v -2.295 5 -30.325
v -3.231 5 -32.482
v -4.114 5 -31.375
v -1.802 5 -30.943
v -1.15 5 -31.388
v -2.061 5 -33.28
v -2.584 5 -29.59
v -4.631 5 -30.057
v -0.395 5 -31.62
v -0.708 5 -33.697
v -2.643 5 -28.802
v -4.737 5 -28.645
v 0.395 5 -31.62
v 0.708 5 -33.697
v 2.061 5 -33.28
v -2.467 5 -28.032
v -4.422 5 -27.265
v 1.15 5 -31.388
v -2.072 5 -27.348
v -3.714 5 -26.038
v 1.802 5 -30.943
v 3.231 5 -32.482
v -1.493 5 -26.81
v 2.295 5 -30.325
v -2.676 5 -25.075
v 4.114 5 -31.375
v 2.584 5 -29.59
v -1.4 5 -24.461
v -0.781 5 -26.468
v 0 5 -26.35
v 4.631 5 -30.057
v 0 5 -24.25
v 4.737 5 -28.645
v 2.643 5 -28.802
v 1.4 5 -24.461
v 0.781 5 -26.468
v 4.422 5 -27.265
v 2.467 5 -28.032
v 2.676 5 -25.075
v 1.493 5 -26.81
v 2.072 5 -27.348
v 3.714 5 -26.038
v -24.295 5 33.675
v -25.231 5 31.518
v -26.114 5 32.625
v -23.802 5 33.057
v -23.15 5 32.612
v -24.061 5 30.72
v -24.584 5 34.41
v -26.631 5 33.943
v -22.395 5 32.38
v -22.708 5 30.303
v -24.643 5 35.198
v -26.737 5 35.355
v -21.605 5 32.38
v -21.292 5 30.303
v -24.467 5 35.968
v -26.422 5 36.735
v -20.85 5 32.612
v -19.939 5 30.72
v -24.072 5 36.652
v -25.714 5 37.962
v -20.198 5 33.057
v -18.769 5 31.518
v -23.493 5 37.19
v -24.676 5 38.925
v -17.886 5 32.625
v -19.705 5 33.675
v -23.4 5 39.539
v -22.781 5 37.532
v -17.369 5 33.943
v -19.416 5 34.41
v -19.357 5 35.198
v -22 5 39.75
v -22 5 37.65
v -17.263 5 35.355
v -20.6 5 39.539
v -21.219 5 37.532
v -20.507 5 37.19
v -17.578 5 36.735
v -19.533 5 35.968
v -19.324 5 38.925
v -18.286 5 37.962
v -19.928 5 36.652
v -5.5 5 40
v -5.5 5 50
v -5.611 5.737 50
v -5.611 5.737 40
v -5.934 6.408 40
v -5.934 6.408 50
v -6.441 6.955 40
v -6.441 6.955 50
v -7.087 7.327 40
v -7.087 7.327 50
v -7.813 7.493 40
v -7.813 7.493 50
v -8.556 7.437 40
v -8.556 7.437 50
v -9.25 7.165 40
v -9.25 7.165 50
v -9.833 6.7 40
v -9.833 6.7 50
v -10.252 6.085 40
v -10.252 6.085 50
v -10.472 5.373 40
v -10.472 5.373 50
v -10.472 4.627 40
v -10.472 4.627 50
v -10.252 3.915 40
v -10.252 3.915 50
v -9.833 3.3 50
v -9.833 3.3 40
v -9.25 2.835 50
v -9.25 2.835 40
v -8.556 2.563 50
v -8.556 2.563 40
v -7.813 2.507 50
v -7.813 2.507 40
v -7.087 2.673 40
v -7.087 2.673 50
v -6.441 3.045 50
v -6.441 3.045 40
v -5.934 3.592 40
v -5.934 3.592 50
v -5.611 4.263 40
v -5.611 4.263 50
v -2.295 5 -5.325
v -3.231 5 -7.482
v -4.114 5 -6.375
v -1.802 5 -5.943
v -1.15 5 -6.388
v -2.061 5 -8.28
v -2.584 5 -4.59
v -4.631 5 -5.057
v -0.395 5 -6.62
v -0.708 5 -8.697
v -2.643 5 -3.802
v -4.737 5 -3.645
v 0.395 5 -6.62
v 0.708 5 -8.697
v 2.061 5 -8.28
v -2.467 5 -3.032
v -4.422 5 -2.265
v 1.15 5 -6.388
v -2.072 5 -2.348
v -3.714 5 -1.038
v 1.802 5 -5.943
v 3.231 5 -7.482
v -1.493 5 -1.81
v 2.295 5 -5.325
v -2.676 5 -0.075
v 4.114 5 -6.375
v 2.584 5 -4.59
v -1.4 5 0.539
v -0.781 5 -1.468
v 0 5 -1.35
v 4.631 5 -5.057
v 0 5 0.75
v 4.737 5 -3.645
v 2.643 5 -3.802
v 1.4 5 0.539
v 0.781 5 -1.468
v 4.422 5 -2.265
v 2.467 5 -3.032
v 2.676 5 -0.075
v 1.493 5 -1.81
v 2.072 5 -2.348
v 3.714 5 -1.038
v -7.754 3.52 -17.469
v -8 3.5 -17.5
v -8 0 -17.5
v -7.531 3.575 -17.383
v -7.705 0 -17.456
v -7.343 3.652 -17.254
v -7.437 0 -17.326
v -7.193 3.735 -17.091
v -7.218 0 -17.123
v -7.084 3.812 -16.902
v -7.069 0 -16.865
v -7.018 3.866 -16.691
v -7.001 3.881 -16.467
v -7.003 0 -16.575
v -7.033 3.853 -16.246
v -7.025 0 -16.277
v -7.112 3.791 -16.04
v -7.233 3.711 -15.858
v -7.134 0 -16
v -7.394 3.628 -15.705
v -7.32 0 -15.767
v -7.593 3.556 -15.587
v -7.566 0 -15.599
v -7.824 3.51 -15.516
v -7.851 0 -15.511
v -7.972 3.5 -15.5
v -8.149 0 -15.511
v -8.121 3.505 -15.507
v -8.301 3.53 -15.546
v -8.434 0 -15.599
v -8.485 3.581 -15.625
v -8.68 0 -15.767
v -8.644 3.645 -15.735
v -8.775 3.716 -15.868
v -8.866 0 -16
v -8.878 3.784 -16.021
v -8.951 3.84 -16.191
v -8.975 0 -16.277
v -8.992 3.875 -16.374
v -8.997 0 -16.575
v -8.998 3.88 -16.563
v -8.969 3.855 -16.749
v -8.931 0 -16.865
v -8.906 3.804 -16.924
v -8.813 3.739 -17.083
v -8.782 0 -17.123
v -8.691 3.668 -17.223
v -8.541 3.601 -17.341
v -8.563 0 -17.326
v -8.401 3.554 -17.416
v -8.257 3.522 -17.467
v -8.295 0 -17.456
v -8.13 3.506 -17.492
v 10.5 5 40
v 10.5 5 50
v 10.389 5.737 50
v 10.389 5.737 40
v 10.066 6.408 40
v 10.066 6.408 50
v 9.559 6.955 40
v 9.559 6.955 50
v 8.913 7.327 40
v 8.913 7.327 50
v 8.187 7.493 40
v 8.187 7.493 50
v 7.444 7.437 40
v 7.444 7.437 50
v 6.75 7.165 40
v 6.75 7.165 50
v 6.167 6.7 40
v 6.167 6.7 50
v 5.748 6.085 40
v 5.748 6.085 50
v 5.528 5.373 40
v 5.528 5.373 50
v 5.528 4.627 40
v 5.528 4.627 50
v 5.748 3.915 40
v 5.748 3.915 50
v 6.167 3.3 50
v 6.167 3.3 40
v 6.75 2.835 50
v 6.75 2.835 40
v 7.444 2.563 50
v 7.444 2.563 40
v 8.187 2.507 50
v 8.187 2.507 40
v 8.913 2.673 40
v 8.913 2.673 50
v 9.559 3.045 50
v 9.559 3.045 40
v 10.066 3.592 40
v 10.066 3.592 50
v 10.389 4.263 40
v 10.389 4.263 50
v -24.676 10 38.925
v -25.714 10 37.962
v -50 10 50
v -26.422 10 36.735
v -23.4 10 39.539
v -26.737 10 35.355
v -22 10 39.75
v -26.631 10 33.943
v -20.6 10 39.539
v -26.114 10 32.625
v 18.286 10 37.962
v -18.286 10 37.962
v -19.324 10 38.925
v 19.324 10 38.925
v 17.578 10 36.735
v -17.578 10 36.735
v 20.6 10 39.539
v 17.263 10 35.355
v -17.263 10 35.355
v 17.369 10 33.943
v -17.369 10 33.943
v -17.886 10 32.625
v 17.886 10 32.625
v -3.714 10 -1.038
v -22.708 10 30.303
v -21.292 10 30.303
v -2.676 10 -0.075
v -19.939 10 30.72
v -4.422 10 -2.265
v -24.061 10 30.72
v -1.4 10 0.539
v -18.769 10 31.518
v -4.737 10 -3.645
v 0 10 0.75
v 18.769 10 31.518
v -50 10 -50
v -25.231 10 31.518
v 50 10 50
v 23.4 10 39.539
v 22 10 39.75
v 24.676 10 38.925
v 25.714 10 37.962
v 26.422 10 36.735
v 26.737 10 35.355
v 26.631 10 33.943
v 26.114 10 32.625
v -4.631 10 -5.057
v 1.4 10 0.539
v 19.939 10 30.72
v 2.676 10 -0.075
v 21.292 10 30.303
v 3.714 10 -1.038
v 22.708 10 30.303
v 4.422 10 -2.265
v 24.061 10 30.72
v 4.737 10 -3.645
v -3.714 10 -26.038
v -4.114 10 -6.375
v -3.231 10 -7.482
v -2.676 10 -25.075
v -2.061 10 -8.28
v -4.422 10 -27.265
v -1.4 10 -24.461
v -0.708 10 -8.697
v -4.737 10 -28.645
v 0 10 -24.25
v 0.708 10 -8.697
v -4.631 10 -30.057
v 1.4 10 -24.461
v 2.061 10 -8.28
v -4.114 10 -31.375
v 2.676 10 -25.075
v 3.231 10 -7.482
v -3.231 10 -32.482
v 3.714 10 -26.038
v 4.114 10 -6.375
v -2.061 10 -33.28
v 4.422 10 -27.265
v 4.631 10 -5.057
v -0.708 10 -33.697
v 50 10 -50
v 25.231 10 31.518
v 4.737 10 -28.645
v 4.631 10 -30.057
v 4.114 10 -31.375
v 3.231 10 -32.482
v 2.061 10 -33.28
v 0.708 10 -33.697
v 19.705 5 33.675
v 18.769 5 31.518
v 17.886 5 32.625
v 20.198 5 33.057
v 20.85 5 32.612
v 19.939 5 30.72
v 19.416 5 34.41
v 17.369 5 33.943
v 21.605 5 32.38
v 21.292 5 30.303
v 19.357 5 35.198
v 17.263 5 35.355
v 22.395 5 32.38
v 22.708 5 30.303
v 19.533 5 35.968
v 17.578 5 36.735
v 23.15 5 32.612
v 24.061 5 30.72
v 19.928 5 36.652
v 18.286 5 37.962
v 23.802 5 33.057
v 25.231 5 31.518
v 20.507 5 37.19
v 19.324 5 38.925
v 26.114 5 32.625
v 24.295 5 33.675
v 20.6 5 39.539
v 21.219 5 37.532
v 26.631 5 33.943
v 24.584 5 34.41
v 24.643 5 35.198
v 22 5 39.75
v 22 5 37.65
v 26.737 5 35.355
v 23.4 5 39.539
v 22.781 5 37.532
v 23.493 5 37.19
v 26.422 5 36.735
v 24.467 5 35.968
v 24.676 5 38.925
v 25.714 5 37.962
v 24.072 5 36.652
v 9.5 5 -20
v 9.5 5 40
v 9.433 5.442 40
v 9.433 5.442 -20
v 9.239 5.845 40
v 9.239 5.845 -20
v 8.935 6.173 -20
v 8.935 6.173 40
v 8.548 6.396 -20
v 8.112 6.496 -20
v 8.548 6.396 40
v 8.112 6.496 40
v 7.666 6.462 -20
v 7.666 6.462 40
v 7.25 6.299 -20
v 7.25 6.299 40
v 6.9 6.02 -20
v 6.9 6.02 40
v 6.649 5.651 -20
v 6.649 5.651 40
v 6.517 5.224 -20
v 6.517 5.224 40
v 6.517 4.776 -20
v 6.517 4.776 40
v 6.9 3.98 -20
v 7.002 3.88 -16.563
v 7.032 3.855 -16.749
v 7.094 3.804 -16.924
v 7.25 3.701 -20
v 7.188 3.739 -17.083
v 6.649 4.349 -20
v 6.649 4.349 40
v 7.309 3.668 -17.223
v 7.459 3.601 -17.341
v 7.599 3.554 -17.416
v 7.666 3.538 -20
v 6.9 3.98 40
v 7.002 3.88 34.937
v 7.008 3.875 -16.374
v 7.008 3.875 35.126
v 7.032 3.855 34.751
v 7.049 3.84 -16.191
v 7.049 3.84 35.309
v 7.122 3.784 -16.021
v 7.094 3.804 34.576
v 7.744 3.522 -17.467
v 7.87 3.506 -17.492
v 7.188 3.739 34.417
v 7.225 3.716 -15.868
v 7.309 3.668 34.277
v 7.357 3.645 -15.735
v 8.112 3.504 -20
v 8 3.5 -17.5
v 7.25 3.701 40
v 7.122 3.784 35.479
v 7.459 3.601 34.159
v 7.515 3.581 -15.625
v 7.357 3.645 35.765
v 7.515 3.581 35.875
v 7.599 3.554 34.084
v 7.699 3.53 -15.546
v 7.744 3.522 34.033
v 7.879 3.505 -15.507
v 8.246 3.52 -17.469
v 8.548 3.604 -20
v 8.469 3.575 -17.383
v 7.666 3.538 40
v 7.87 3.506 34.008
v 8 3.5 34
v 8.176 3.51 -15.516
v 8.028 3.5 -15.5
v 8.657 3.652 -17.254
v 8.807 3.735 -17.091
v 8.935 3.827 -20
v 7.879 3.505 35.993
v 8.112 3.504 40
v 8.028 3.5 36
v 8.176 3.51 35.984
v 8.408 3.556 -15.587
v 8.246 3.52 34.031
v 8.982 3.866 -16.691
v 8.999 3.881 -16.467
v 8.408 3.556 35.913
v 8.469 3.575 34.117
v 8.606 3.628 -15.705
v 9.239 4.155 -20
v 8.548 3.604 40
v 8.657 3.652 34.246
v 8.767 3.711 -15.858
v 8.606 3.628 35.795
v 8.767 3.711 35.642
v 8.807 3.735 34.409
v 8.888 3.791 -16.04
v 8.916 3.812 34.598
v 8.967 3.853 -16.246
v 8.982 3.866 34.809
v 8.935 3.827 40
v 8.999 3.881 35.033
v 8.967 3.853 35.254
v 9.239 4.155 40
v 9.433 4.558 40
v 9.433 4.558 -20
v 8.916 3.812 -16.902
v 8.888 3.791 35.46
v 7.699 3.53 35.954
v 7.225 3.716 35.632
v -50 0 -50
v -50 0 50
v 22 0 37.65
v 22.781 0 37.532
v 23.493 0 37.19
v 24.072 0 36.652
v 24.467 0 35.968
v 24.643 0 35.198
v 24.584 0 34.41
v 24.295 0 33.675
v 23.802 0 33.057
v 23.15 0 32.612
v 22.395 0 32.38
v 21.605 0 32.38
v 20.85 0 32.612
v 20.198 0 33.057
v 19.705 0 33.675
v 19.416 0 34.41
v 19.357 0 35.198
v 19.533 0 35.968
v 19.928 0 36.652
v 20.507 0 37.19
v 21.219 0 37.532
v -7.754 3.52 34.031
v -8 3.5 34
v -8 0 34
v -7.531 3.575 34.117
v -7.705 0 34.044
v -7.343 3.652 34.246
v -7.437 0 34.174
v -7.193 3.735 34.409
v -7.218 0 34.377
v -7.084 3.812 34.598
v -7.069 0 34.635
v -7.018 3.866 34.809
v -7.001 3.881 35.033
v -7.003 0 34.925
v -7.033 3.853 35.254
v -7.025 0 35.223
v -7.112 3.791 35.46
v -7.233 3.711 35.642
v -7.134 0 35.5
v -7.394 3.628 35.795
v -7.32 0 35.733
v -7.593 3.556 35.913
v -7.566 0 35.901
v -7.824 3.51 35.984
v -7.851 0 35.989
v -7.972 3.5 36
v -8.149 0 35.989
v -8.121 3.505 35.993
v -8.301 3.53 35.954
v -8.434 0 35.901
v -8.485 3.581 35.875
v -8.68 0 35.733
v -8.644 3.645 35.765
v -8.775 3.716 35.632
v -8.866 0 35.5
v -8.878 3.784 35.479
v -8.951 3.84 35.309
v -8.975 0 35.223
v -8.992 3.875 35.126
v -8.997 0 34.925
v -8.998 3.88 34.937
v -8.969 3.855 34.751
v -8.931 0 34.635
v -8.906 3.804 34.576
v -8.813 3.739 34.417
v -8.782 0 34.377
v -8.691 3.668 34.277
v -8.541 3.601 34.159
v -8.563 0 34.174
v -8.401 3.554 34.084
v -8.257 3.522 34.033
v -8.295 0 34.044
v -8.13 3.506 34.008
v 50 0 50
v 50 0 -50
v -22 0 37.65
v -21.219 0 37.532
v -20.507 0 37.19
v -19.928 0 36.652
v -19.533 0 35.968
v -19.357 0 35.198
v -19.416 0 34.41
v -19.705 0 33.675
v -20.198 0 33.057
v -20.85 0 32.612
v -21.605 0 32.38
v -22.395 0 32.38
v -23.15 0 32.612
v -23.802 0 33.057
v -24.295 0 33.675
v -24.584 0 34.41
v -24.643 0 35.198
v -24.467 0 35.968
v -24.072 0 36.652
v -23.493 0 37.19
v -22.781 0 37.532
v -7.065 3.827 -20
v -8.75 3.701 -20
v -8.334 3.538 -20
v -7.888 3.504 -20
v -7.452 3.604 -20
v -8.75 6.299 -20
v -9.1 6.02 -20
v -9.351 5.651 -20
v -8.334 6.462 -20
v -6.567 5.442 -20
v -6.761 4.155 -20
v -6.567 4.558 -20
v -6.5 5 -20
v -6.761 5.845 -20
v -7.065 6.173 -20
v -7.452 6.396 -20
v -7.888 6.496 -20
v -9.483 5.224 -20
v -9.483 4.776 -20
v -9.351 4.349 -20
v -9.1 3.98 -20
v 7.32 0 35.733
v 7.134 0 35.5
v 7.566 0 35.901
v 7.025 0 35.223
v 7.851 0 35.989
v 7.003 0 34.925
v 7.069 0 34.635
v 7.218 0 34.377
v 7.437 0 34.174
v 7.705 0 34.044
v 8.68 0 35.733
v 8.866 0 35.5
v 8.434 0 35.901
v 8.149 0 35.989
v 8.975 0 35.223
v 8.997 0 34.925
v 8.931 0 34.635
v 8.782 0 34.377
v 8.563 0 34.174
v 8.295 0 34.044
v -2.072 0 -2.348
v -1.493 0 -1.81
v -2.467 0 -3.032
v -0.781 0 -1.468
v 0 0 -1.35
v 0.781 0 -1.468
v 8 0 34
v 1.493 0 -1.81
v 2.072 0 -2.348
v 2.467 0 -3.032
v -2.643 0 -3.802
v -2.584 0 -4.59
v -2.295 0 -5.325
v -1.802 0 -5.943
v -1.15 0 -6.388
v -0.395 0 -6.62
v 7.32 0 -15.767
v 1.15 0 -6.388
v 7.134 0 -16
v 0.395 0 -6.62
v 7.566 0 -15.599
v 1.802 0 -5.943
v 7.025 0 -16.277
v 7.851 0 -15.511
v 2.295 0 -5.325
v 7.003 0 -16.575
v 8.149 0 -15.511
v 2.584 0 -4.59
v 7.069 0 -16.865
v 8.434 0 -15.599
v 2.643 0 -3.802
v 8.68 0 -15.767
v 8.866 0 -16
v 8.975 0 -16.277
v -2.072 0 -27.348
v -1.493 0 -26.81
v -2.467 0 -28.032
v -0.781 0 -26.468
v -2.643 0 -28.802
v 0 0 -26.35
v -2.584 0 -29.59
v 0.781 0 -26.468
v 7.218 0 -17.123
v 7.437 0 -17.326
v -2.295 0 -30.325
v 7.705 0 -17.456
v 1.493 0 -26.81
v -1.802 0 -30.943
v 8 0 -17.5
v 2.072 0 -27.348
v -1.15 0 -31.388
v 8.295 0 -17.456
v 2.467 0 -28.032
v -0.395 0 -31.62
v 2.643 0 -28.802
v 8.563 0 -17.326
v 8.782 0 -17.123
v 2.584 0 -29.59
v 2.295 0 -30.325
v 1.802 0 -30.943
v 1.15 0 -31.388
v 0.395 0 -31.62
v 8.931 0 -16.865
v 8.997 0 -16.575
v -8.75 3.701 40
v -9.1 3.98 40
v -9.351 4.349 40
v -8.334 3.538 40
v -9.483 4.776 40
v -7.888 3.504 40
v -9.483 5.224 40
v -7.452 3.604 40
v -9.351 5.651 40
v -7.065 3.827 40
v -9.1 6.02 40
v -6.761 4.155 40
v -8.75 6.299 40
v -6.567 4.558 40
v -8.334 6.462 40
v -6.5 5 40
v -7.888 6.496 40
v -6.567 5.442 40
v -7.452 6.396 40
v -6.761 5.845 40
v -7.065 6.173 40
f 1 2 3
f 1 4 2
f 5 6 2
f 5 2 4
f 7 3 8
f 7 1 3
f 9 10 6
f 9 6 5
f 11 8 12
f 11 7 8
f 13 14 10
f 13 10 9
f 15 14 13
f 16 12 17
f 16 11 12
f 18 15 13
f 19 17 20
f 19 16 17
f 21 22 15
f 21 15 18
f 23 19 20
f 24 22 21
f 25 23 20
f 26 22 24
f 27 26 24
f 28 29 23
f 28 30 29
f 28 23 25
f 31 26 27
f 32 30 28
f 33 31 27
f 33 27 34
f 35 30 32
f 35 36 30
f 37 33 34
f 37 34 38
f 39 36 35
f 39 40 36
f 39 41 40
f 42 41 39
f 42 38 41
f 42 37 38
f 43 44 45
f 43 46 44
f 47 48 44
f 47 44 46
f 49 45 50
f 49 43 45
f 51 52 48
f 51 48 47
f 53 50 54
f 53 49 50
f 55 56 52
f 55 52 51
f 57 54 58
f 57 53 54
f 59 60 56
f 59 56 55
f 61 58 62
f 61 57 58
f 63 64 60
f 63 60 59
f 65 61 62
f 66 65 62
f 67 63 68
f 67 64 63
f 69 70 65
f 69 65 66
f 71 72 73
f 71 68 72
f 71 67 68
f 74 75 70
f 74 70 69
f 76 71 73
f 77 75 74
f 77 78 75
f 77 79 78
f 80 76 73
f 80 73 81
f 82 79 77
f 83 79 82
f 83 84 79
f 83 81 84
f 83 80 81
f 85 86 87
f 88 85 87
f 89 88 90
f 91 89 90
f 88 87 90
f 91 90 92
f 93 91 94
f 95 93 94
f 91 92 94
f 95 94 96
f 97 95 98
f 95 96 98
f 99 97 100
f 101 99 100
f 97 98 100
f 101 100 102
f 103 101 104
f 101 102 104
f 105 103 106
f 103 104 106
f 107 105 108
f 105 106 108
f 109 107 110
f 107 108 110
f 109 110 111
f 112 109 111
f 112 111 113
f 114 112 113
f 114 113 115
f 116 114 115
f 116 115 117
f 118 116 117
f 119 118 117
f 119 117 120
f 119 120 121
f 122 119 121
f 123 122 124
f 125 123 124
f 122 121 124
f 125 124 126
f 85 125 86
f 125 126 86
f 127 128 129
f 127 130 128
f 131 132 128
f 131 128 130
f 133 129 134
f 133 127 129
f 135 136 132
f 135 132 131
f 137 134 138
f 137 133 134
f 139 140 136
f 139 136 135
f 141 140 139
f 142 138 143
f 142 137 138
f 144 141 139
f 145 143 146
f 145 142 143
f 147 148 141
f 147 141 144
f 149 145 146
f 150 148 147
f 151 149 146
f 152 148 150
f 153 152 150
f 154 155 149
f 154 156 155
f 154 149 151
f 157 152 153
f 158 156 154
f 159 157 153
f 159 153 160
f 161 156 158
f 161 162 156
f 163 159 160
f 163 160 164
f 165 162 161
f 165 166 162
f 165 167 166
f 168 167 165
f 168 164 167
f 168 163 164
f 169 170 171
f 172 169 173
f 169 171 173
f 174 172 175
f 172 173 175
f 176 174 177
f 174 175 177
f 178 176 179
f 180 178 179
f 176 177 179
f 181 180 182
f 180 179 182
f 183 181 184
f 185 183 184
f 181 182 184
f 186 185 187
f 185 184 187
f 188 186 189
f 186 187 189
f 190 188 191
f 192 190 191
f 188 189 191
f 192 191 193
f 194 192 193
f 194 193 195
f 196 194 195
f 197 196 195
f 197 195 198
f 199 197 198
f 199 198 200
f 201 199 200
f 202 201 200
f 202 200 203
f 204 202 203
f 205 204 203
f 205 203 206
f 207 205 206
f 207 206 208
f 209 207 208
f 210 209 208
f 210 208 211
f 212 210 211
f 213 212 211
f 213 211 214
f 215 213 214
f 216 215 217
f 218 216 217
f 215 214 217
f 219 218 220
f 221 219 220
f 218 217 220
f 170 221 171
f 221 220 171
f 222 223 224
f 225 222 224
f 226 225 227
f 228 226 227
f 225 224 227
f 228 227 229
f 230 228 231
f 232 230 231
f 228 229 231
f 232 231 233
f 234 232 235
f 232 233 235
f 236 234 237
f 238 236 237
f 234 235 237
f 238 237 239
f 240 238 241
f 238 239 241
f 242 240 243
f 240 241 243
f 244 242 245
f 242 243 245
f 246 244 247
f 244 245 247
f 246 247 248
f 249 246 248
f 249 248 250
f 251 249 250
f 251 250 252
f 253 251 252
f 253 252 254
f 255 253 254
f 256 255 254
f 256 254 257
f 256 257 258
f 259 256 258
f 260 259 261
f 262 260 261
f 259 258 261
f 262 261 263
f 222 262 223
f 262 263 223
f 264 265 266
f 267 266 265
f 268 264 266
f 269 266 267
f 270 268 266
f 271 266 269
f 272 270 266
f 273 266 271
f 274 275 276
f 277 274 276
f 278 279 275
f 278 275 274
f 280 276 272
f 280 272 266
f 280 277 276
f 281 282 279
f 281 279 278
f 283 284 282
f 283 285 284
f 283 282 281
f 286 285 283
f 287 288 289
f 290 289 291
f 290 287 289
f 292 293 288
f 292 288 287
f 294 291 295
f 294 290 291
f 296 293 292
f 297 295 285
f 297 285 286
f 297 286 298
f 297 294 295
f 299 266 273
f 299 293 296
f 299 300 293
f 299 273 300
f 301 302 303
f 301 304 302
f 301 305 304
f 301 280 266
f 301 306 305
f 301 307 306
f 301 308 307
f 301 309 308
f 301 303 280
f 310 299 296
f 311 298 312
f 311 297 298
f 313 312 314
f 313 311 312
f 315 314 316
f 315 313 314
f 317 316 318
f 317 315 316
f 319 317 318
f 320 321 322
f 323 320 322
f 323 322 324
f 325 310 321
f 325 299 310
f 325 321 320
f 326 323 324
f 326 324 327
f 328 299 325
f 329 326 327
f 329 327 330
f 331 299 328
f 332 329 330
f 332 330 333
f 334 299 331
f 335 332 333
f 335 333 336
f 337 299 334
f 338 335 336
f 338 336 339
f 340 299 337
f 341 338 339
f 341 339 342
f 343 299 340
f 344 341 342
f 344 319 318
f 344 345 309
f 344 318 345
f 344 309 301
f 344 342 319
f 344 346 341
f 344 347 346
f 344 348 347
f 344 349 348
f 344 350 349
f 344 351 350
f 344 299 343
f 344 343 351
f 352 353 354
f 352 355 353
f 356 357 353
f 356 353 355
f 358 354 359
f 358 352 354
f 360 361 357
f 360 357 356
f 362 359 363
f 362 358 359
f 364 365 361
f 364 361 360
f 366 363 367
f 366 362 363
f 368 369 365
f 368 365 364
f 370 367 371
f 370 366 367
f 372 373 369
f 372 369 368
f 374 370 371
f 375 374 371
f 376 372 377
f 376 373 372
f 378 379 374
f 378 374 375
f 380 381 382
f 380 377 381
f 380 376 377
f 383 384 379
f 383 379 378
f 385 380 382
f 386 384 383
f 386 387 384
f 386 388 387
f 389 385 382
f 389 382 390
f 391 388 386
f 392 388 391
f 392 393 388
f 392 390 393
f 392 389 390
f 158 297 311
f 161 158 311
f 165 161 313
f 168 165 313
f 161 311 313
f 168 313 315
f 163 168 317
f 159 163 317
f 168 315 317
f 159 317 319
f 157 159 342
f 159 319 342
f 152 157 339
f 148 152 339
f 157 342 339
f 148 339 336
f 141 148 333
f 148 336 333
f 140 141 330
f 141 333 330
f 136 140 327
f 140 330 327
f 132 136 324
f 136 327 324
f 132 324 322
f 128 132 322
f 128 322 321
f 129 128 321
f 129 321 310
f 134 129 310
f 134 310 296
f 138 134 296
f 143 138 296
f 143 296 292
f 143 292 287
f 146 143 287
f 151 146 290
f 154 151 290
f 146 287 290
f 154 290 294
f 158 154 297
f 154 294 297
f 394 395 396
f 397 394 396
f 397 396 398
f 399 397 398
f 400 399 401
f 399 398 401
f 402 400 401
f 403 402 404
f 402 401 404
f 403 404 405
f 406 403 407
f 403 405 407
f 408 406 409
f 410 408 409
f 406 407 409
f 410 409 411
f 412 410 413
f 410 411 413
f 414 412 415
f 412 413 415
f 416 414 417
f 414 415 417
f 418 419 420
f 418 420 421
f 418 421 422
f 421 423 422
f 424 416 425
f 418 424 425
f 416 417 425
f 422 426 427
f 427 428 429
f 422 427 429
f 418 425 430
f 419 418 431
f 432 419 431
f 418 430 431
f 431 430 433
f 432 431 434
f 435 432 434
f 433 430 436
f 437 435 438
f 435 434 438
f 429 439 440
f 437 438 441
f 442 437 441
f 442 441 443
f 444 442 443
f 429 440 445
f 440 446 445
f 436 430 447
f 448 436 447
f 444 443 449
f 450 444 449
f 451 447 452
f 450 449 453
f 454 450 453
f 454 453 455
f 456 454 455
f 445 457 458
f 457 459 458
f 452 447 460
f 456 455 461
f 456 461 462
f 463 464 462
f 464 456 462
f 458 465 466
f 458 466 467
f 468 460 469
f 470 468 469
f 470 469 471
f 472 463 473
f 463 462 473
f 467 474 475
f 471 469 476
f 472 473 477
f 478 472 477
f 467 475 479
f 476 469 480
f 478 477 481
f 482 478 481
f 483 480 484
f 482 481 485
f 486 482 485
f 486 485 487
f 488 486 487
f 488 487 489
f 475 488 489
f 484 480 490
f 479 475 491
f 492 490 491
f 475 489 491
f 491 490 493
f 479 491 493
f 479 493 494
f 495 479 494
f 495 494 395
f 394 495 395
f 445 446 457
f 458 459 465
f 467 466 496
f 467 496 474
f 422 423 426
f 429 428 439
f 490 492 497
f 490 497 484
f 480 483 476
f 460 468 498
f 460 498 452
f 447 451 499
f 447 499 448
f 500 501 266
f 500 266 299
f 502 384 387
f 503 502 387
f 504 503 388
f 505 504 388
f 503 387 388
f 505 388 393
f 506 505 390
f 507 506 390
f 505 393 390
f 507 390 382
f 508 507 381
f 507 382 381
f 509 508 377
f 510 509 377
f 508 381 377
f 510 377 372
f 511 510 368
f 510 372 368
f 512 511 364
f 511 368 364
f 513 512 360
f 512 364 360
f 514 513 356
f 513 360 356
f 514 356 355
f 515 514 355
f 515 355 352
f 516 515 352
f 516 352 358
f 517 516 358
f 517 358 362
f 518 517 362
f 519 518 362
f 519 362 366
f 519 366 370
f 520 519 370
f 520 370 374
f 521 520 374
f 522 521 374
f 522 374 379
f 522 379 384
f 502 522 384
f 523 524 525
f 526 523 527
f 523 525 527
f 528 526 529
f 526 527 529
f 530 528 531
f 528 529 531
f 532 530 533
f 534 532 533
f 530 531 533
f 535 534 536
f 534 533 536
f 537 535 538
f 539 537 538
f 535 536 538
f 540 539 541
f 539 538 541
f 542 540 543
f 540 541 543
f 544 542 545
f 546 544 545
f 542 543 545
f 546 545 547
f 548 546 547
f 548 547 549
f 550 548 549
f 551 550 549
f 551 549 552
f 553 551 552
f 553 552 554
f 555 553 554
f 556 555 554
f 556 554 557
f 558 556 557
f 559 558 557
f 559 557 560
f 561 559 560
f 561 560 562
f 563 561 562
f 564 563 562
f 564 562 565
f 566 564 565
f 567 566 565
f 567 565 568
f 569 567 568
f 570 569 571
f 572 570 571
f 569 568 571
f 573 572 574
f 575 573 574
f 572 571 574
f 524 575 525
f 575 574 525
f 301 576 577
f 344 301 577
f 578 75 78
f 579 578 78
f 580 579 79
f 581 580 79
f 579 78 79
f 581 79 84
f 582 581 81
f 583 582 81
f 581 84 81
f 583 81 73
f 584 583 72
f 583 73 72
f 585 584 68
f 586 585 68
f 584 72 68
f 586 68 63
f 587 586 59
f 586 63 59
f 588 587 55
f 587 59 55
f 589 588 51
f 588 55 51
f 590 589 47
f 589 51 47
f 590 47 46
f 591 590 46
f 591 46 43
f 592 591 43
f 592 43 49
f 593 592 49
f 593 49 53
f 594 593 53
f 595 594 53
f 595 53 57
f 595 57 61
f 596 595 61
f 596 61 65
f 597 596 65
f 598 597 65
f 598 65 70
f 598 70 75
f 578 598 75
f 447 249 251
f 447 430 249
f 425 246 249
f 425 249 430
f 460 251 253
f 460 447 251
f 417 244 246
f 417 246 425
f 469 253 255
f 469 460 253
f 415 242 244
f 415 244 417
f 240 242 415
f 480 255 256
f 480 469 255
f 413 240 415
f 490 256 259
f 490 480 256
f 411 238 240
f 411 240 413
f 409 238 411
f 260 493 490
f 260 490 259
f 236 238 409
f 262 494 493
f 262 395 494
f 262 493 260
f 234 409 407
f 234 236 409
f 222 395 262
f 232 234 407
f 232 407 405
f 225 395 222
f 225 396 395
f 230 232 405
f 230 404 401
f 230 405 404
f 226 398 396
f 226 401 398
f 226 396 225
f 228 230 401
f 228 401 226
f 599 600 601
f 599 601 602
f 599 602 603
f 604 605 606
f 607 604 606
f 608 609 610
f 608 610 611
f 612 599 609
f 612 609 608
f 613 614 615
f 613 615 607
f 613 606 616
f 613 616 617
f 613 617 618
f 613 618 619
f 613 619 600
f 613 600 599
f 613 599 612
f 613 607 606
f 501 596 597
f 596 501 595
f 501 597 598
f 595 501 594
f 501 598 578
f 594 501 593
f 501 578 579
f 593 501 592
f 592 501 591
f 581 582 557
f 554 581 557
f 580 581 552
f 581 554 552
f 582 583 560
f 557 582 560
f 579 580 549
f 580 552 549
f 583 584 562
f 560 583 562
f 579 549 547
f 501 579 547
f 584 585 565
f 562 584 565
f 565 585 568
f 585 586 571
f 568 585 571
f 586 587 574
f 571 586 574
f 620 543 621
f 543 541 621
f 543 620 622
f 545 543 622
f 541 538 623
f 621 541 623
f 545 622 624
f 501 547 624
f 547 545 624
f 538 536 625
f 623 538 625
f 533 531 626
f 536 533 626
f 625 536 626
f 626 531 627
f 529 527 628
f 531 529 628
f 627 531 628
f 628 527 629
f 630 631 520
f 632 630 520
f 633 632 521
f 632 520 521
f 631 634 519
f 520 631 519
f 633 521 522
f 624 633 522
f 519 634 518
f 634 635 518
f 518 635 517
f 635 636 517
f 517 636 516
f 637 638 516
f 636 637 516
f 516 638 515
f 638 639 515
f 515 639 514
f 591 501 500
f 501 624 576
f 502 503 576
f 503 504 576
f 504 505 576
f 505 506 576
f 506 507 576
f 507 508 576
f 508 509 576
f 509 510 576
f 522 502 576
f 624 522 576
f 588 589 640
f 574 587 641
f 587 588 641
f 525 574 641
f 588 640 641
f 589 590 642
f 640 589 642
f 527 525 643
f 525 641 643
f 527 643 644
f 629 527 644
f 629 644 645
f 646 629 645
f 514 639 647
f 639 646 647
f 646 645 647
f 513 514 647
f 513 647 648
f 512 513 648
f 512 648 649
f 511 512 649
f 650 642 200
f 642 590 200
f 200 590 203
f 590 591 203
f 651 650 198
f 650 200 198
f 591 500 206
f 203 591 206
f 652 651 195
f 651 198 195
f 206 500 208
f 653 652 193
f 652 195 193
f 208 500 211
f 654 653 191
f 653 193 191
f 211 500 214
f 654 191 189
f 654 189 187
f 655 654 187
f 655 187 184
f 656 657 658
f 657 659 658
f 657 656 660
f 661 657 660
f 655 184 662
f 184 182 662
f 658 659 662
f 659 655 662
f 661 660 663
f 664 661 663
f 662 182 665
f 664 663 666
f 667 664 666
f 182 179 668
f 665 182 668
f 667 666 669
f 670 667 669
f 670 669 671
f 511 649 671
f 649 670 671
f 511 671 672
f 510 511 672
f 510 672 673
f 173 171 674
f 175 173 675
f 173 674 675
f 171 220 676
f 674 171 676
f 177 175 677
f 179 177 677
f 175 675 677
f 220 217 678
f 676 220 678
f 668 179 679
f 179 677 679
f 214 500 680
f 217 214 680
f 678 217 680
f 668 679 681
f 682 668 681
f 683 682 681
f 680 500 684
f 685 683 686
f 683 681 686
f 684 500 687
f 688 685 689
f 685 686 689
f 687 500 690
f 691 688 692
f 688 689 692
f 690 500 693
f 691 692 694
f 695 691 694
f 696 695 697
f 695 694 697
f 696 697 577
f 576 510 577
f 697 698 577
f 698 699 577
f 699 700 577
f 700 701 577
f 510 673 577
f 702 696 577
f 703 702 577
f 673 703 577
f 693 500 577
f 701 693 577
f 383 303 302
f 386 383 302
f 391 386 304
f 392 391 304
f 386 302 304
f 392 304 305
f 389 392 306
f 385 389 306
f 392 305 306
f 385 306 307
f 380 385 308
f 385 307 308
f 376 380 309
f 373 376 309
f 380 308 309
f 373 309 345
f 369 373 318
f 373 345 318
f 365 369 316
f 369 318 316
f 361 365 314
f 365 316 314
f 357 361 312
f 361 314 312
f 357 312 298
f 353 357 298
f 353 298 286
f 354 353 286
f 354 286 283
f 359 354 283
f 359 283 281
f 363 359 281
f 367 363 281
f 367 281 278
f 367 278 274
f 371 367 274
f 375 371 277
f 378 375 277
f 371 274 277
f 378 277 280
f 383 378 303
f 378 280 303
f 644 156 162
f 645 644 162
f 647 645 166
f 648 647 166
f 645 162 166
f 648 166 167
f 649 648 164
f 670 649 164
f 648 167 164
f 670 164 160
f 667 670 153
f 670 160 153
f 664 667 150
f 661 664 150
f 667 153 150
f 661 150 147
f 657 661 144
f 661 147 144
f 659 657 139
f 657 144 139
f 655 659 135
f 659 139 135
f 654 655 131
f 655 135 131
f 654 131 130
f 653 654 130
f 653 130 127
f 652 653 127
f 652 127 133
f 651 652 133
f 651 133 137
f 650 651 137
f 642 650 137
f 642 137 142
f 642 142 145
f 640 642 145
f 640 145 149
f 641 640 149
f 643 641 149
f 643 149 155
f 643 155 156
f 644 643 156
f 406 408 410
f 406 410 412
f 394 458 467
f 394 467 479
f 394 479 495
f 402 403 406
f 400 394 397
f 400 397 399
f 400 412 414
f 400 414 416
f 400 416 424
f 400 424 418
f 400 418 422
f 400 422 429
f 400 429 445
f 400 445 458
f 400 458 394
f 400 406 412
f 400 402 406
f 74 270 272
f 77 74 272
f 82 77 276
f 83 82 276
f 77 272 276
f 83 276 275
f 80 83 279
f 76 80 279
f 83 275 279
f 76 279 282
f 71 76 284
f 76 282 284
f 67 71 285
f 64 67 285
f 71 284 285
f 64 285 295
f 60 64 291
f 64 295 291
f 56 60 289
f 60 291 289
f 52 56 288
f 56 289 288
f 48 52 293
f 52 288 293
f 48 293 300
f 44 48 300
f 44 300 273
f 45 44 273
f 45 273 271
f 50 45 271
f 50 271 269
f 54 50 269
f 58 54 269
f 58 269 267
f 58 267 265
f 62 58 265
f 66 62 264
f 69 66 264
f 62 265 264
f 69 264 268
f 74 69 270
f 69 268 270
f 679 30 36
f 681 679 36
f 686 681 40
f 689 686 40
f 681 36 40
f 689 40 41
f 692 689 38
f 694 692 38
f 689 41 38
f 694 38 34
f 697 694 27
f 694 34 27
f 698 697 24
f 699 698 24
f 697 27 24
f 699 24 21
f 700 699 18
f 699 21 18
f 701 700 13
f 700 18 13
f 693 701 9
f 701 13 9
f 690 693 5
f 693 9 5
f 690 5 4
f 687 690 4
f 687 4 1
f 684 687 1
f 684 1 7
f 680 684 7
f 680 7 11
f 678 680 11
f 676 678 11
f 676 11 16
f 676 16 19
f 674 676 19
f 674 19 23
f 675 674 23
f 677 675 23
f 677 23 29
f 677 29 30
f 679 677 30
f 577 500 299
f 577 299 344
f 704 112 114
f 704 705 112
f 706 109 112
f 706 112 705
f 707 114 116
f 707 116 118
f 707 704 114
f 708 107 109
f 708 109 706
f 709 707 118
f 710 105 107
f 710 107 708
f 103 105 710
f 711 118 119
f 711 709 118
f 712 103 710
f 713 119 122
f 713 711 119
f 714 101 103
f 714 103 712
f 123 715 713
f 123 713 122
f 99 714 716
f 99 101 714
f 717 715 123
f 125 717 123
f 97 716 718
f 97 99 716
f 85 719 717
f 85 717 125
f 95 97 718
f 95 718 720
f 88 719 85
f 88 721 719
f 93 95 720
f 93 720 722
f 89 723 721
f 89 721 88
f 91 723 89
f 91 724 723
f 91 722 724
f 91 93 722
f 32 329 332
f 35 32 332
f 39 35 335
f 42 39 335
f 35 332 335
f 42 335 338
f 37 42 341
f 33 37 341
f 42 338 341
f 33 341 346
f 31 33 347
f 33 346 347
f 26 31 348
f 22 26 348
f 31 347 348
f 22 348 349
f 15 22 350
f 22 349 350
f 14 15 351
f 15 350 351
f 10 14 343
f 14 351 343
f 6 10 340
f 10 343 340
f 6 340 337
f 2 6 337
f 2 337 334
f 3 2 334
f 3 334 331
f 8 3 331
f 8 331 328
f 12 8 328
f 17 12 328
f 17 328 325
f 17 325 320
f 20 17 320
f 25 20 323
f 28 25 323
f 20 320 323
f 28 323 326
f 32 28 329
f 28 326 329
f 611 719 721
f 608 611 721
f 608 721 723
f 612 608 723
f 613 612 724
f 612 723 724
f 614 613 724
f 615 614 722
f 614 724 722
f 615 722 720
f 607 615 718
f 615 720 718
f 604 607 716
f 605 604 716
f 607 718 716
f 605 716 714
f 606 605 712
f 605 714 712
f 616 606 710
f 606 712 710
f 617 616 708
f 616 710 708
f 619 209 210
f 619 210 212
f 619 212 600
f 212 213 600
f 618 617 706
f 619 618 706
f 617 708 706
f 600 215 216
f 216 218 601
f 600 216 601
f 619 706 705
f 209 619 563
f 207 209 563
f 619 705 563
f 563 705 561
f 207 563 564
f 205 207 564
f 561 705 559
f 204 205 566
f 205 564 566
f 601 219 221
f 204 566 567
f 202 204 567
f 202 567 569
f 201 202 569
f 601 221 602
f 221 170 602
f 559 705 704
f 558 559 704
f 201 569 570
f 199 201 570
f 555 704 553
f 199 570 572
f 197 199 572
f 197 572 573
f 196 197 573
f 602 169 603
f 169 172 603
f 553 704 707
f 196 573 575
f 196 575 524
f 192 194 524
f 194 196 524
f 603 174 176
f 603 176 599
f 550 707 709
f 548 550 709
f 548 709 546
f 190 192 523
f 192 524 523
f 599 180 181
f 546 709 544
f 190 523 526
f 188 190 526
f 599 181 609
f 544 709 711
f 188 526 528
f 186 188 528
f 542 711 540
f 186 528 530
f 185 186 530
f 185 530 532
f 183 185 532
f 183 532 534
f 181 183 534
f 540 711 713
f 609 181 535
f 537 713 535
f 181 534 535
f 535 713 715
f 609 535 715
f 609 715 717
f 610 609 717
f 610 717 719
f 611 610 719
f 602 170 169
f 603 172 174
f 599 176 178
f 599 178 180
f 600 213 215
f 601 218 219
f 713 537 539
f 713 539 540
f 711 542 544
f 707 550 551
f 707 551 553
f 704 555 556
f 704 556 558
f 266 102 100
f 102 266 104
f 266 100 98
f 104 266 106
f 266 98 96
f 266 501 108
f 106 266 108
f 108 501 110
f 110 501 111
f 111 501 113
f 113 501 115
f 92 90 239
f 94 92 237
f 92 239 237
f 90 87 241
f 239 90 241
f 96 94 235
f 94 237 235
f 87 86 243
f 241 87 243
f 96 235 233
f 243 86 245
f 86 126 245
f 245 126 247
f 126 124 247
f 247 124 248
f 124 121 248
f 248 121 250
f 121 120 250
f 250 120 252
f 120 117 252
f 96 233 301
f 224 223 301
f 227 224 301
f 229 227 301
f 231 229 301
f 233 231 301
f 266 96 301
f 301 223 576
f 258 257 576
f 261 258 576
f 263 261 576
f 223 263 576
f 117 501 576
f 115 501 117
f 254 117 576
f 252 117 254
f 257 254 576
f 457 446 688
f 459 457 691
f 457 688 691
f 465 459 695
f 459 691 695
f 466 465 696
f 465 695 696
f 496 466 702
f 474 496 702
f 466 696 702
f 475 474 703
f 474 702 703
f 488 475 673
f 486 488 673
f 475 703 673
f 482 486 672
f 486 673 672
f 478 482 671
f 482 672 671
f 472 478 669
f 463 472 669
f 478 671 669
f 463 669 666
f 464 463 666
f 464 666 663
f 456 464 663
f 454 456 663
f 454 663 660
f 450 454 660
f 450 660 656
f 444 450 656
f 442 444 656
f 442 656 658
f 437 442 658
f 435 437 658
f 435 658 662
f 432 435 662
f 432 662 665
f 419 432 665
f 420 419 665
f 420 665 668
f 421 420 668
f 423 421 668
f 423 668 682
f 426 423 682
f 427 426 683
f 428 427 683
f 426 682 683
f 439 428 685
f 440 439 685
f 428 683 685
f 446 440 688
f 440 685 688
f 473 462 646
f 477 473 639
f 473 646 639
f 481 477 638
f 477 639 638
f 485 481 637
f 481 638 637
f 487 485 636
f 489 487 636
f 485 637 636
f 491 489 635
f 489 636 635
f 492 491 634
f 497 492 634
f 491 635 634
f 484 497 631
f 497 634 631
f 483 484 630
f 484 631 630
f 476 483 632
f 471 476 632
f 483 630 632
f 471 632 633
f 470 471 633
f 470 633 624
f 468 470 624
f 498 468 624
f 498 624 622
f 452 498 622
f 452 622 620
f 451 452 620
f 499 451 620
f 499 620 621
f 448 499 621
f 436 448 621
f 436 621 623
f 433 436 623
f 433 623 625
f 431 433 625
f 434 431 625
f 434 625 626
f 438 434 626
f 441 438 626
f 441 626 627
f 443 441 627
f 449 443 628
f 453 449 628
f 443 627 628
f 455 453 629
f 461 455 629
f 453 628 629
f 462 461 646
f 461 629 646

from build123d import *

# Parameters (mm, degrees)
SKETCH_1_W          = 100
SKETCH_1_H          = 100
EXTRUDE_1_DEPTH     = 10
SKETCH_3_R          = 2.5
CUT_EXTRUDE_1_DEPTH = 10
SKETCH_3_3_R        = 1.5
CUT_EXTRUDE_2_DEPTH = 70
SKETCH_3_4_R        = 1.5
CUT_EXTRUDE_3_DEPTH = 70
SKETCH_3_7_R        = 2.5
CUT_EXTRUDE_4_DEPTH = 10
SKETCH_4_R          = 1
CUT_EXTRUDE_5_DEPTH = 5
SKETCH_2_R          = 2.65
CUT_EXTRUDE_6_DEPTH = 10
SKETCH_2_3_R        = 4.75
SKETCH_2_3_R_2      = 2.65
CUT_EXTRUDE_7_DEPTH = 5


with BuildPart() as part:
    # 스케치1 → 보스-돌출1 (new body)
    with BuildSketch(Plane(origin=(0, 0, 0), x_dir=(1, 0, 0), z_dir=(0, 1, 0))):
        Rectangle(SKETCH_1_W, SKETCH_1_H)
    extrude(amount=EXTRUDE_1_DEPTH)

    # 스케치3 → 컷-돌출1 (cut)
    with BuildSketch(Plane.XY.offset(50)):
        with Locations((-8, 5)):
            Circle(SKETCH_3_R)
    extrude(amount=-CUT_EXTRUDE_1_DEPTH, mode=Mode.SUBTRACT)

    # 스케치3<3> → 컷-돌출2 (cut)
    with BuildSketch(Plane.XY.offset(50)):
        with Locations((-8, 5)):
            Circle(SKETCH_3_3_R)
    extrude(amount=-CUT_EXTRUDE_2_DEPTH, mode=Mode.SUBTRACT)

    # 스케치3<4> → 컷-돌출3 (cut)
    with BuildSketch(Plane.XY.offset(50)):
        with Locations((8, 5)):
            Circle(SKETCH_3_4_R)
    extrude(amount=-CUT_EXTRUDE_3_DEPTH, mode=Mode.SUBTRACT)

    # 스케치3<7> → 컷-돌출4 (cut)
    with BuildSketch(Plane.XY.offset(50)):
        with Locations((8, 5)):
            Circle(SKETCH_3_7_R)
    extrude(amount=-CUT_EXTRUDE_4_DEPTH, mode=Mode.SUBTRACT)

    # 스케치4 → 컷-돌출5 (cut)
    with BuildSketch(Plane.XZ):
        with Locations((-8.000069435, 35)):
            Circle(SKETCH_4_R)
        with Locations((8, 35)):
            Circle(SKETCH_4_R)
        with Locations((8, -16.5)):
            Circle(SKETCH_4_R)
        with Locations((-8.000069435, -16.5)):
            Circle(SKETCH_4_R)
    extrude(amount=-CUT_EXTRUDE_5_DEPTH, mode=Mode.SUBTRACT)

    # 스케치2 → 컷-돌출6 (cut)
    with BuildSketch(Plane(origin=(0, 10, 0), x_dir=(1, 0, 0), z_dir=(0, 1, 0))):
        with Locations((0, 29)):
            Circle(SKETCH_2_R)
        with Locations((0, 4)):
            Circle(SKETCH_2_R)
        with Locations((-22, -35)):
            Circle(SKETCH_2_R)
        with Locations((22, -35)):
            Circle(SKETCH_2_R)
    extrude(amount=-CUT_EXTRUDE_6_DEPTH, mode=Mode.SUBTRACT)

    # 스케치2<3> → 컷-돌출7 (cut)
    # profile 1 of 4: a face of its own
    with BuildSketch(Plane(origin=(0, 10, 0), x_dir=(1, 0, 0), z_dir=(0, 1, 0))):
        with Locations((0, 29)):
            Circle(SKETCH_2_3_R)
        with Locations((0, 29)):
            Circle(SKETCH_2_3_R_2, mode=Mode.SUBTRACT)
    # profile 2 of 4: a face of its own
    with BuildSketch(Plane(origin=(0, 10, 0), x_dir=(1, 0, 0), z_dir=(0, 1, 0))):
        with Locations((0, 4)):
            Circle(SKETCH_2_3_R)
        with Locations((0, 4)):
            Circle(SKETCH_2_3_R_2, mode=Mode.SUBTRACT)
    # profile 3 of 4: a face of its own
    with BuildSketch(Plane(origin=(0, 10, 0), x_dir=(1, 0, 0), z_dir=(0, 1, 0))):
        with Locations((-22, -35)):
            Circle(SKETCH_2_3_R)
        with Locations((-22, -35)):
            Circle(SKETCH_2_3_R_2, mode=Mode.SUBTRACT)
    # profile 4 of 4: a face of its own
    with BuildSketch(Plane(origin=(0, 10, 0), x_dir=(1, 0, 0), z_dir=(0, 1, 0))):
        with Locations((22, -35)):
            Circle(SKETCH_2_3_R)
        with Locations((22, -35)):
            Circle(SKETCH_2_3_R_2, mode=Mode.SUBTRACT)
    extrude(amount=-CUT_EXTRUDE_7_DEPTH, mode=Mode.SUBTRACT)


solid = part.part
